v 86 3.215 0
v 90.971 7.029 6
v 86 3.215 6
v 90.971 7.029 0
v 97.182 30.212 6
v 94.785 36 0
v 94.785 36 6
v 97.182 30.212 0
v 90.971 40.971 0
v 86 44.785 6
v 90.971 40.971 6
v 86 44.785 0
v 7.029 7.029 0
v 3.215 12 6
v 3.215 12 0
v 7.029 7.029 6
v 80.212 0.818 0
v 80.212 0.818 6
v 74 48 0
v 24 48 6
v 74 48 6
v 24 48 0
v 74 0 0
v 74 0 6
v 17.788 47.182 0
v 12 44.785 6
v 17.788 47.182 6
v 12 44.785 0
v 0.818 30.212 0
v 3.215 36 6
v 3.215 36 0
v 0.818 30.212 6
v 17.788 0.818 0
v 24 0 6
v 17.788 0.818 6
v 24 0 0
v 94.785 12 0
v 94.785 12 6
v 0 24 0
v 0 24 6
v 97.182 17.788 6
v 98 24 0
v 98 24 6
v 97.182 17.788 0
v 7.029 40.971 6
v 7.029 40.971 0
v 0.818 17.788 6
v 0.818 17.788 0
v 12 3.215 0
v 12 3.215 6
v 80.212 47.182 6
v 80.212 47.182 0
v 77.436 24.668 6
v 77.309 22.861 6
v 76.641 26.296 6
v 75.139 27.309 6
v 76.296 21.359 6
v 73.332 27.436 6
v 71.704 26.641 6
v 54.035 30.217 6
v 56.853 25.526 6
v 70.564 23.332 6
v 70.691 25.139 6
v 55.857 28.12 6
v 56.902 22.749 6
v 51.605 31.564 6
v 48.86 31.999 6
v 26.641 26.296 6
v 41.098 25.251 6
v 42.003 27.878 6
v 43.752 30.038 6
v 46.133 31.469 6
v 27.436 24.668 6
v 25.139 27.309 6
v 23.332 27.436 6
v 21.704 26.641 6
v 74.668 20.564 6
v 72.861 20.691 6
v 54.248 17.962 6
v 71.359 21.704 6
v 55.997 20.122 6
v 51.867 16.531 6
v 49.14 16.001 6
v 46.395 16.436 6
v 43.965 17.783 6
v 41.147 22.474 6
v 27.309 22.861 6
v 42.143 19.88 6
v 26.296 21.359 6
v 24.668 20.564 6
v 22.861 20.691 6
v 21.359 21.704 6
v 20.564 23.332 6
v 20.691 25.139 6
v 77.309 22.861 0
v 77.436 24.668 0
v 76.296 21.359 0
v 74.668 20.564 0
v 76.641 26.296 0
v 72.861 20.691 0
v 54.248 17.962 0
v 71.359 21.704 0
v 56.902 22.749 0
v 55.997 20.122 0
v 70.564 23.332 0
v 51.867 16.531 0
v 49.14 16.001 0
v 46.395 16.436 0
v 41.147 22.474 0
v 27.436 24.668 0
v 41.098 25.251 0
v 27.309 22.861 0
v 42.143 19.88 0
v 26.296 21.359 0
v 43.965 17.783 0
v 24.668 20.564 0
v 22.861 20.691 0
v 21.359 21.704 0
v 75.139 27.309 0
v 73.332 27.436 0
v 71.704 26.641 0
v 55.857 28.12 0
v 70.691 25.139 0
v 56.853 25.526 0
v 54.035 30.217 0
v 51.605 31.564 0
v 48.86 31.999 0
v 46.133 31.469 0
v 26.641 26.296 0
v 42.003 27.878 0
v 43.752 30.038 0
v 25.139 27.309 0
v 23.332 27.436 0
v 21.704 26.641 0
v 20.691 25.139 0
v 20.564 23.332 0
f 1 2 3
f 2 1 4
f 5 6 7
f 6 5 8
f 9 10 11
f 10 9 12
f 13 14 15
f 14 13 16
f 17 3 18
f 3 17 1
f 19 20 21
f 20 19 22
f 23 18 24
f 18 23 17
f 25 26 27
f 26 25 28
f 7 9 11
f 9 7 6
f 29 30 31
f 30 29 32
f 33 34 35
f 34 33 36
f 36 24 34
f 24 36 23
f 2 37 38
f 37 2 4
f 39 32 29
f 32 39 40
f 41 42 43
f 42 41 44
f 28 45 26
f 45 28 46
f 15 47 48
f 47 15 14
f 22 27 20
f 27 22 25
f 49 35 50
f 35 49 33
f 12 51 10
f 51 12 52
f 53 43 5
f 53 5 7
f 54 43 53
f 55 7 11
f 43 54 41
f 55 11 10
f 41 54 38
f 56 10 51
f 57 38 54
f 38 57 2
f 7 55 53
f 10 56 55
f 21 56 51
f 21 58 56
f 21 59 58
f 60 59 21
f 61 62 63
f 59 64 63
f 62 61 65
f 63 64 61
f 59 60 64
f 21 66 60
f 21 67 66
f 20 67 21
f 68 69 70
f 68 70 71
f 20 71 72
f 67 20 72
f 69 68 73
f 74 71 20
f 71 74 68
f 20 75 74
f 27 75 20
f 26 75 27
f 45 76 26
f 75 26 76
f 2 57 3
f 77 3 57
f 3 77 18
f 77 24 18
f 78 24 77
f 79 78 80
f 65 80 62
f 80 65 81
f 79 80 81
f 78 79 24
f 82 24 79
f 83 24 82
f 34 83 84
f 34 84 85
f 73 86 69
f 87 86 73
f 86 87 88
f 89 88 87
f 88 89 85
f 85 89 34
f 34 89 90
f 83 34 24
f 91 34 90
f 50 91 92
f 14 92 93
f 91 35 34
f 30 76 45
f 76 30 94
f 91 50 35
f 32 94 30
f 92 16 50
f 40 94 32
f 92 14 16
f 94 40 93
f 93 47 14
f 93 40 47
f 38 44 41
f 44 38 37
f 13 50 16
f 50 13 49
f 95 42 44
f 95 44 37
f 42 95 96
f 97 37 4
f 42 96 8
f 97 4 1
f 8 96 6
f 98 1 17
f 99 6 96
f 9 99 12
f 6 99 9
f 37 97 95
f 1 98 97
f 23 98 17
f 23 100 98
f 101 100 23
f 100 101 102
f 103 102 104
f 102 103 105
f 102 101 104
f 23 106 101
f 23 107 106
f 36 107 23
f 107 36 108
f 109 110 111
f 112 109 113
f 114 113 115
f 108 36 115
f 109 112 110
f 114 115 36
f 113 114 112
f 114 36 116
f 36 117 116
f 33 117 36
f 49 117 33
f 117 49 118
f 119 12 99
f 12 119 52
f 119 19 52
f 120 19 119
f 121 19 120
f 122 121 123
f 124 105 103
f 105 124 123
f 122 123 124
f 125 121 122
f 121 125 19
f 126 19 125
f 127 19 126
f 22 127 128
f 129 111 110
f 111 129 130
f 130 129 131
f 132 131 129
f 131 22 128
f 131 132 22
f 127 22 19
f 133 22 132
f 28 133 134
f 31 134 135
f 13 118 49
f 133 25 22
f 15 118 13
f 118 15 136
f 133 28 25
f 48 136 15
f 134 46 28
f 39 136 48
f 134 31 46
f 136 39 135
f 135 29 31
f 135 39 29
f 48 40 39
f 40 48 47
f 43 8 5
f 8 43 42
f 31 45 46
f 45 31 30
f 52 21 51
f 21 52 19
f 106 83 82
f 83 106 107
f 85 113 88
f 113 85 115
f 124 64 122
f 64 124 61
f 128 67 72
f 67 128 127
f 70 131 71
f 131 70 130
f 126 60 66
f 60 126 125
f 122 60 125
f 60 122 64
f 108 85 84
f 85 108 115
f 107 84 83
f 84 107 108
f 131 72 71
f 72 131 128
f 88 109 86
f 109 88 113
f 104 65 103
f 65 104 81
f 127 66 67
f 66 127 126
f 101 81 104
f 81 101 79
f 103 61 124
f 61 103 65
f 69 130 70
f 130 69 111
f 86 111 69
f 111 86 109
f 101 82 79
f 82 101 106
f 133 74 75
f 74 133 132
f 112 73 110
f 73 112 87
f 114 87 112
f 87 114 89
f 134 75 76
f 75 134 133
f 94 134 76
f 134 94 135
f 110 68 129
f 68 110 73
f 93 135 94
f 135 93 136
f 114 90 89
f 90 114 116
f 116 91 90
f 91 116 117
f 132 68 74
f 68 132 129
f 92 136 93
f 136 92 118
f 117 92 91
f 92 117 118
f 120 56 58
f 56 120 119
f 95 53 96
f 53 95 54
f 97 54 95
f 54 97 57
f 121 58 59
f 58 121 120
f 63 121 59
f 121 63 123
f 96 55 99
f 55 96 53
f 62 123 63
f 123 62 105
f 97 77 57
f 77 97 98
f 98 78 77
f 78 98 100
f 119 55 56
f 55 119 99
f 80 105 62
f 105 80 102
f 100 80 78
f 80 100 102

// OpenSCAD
$fn = 32;

// ----------------------------------------------------------------------
// Spacer plate: obround span 50, caps R24
// ----------------------------------------------------------------------

// --- parameters (mm) ---
bore_r = 8;               // centre bore radius
bolt_r = 3.5;             // bolt hole radius
plate_t = 6;              // plate thickness, Z (extrusion height)
span = 50;                // obround span
cap_r = 24;               // cap radius

profile = [[24, 48], [17.788, 47.182], [12, 44.785], [7.029, 40.971], [3.215, 36], [0.818, 30.212], [0, 24], [0.818, 17.788], [3.215, 12], [7.029, 7.029], [12, 3.215], [17.788, 0.818], [24, 0], [74, 0], [80.212, 0.818], [86, 3.215], [90.971, 7.029], [94.785, 12], [97.182, 17.788], [98, 24], [97.182, 30.212], [94.785, 36], [90.971, 40.971], [86, 44.785], [80.212, 47.182], [74, 48]];  // primary outline, 26 points, counter clockwise
void_1 = [[56.853, 25.526], [55.857, 28.12], [54.035, 30.217], [51.605, 31.564], [48.86, 31.999], [46.133, 31.469], [43.752, 30.038], [42.003, 27.878], [41.098, 25.251], [41.147, 22.474], [42.143, 19.88], [43.965, 17.783], [46.395, 16.436], [49.14, 16.001], [51.867, 16.531], [54.248, 17.962], [55.997, 20.122], [56.902, 22.749]];  // centre bore, 18 points
void_2 = [[27.436, 24.668], [26.641, 26.296], [25.139, 27.309], [23.332, 27.436], [21.704, 26.641], [20.691, 25.139], [20.564, 23.332], [21.359, 21.704], [22.861, 20.691], [24.668, 20.564], [26.296, 21.359], [27.309, 22.861]];  // end hole, 12 points
void_3 = [[77.436, 24.668], [76.641, 26.296], [75.139, 27.309], [73.332, 27.436], [71.704, 26.641], [70.691, 25.139], [70.564, 23.332], [71.359, 21.704], [72.861, 20.691], [74.668, 20.564], [76.296, 21.359], [77.309, 22.861]];  // end hole, 12 points

// --- the one profile operation ---
difference() {
  linear_extrude(height = plate_t) polygon(points = profile);
  translate([0, 0, -1])
    linear_extrude(height = plate_t + 2) polygon(points = void_1);
  translate([0, 0, -1])
    linear_extrude(height = plate_t + 2) polygon(points = void_2);
  translate([0, 0, -1])
    linear_extrude(height = plate_t + 2) polygon(points = void_3);
}
